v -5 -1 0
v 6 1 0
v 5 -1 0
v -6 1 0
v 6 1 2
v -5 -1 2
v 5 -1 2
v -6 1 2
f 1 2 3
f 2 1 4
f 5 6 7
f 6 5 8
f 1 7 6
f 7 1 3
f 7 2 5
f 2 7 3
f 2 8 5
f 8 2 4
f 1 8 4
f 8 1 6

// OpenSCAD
// Rectangular shaft key with chamfered ends.
$fn = 60;
eps = 0.02;
key_w = 2;
key_h = 2;
key_l = 12;
chamfer = 1;
polyhedron(points = [
    [-key_l / 2 + chamfer, -key_w / 2, 0], [key_l / 2 - chamfer, -key_w / 2, 0], [key_l / 2, key_w / 2, 0], [-key_l / 2, key_w / 2, 0],
    [-key_l / 2 + chamfer, -key_w / 2, key_h], [key_l / 2 - chamfer, -key_w / 2, key_h], [key_l / 2, key_w / 2, key_h], [-key_l / 2, key_w / 2, key_h]
], faces = [[0,1,2,3],[4,7,6,5],[0,4,5,1],[1,5,6,2],[2,6,7,3],[3,7,4,0]]);
